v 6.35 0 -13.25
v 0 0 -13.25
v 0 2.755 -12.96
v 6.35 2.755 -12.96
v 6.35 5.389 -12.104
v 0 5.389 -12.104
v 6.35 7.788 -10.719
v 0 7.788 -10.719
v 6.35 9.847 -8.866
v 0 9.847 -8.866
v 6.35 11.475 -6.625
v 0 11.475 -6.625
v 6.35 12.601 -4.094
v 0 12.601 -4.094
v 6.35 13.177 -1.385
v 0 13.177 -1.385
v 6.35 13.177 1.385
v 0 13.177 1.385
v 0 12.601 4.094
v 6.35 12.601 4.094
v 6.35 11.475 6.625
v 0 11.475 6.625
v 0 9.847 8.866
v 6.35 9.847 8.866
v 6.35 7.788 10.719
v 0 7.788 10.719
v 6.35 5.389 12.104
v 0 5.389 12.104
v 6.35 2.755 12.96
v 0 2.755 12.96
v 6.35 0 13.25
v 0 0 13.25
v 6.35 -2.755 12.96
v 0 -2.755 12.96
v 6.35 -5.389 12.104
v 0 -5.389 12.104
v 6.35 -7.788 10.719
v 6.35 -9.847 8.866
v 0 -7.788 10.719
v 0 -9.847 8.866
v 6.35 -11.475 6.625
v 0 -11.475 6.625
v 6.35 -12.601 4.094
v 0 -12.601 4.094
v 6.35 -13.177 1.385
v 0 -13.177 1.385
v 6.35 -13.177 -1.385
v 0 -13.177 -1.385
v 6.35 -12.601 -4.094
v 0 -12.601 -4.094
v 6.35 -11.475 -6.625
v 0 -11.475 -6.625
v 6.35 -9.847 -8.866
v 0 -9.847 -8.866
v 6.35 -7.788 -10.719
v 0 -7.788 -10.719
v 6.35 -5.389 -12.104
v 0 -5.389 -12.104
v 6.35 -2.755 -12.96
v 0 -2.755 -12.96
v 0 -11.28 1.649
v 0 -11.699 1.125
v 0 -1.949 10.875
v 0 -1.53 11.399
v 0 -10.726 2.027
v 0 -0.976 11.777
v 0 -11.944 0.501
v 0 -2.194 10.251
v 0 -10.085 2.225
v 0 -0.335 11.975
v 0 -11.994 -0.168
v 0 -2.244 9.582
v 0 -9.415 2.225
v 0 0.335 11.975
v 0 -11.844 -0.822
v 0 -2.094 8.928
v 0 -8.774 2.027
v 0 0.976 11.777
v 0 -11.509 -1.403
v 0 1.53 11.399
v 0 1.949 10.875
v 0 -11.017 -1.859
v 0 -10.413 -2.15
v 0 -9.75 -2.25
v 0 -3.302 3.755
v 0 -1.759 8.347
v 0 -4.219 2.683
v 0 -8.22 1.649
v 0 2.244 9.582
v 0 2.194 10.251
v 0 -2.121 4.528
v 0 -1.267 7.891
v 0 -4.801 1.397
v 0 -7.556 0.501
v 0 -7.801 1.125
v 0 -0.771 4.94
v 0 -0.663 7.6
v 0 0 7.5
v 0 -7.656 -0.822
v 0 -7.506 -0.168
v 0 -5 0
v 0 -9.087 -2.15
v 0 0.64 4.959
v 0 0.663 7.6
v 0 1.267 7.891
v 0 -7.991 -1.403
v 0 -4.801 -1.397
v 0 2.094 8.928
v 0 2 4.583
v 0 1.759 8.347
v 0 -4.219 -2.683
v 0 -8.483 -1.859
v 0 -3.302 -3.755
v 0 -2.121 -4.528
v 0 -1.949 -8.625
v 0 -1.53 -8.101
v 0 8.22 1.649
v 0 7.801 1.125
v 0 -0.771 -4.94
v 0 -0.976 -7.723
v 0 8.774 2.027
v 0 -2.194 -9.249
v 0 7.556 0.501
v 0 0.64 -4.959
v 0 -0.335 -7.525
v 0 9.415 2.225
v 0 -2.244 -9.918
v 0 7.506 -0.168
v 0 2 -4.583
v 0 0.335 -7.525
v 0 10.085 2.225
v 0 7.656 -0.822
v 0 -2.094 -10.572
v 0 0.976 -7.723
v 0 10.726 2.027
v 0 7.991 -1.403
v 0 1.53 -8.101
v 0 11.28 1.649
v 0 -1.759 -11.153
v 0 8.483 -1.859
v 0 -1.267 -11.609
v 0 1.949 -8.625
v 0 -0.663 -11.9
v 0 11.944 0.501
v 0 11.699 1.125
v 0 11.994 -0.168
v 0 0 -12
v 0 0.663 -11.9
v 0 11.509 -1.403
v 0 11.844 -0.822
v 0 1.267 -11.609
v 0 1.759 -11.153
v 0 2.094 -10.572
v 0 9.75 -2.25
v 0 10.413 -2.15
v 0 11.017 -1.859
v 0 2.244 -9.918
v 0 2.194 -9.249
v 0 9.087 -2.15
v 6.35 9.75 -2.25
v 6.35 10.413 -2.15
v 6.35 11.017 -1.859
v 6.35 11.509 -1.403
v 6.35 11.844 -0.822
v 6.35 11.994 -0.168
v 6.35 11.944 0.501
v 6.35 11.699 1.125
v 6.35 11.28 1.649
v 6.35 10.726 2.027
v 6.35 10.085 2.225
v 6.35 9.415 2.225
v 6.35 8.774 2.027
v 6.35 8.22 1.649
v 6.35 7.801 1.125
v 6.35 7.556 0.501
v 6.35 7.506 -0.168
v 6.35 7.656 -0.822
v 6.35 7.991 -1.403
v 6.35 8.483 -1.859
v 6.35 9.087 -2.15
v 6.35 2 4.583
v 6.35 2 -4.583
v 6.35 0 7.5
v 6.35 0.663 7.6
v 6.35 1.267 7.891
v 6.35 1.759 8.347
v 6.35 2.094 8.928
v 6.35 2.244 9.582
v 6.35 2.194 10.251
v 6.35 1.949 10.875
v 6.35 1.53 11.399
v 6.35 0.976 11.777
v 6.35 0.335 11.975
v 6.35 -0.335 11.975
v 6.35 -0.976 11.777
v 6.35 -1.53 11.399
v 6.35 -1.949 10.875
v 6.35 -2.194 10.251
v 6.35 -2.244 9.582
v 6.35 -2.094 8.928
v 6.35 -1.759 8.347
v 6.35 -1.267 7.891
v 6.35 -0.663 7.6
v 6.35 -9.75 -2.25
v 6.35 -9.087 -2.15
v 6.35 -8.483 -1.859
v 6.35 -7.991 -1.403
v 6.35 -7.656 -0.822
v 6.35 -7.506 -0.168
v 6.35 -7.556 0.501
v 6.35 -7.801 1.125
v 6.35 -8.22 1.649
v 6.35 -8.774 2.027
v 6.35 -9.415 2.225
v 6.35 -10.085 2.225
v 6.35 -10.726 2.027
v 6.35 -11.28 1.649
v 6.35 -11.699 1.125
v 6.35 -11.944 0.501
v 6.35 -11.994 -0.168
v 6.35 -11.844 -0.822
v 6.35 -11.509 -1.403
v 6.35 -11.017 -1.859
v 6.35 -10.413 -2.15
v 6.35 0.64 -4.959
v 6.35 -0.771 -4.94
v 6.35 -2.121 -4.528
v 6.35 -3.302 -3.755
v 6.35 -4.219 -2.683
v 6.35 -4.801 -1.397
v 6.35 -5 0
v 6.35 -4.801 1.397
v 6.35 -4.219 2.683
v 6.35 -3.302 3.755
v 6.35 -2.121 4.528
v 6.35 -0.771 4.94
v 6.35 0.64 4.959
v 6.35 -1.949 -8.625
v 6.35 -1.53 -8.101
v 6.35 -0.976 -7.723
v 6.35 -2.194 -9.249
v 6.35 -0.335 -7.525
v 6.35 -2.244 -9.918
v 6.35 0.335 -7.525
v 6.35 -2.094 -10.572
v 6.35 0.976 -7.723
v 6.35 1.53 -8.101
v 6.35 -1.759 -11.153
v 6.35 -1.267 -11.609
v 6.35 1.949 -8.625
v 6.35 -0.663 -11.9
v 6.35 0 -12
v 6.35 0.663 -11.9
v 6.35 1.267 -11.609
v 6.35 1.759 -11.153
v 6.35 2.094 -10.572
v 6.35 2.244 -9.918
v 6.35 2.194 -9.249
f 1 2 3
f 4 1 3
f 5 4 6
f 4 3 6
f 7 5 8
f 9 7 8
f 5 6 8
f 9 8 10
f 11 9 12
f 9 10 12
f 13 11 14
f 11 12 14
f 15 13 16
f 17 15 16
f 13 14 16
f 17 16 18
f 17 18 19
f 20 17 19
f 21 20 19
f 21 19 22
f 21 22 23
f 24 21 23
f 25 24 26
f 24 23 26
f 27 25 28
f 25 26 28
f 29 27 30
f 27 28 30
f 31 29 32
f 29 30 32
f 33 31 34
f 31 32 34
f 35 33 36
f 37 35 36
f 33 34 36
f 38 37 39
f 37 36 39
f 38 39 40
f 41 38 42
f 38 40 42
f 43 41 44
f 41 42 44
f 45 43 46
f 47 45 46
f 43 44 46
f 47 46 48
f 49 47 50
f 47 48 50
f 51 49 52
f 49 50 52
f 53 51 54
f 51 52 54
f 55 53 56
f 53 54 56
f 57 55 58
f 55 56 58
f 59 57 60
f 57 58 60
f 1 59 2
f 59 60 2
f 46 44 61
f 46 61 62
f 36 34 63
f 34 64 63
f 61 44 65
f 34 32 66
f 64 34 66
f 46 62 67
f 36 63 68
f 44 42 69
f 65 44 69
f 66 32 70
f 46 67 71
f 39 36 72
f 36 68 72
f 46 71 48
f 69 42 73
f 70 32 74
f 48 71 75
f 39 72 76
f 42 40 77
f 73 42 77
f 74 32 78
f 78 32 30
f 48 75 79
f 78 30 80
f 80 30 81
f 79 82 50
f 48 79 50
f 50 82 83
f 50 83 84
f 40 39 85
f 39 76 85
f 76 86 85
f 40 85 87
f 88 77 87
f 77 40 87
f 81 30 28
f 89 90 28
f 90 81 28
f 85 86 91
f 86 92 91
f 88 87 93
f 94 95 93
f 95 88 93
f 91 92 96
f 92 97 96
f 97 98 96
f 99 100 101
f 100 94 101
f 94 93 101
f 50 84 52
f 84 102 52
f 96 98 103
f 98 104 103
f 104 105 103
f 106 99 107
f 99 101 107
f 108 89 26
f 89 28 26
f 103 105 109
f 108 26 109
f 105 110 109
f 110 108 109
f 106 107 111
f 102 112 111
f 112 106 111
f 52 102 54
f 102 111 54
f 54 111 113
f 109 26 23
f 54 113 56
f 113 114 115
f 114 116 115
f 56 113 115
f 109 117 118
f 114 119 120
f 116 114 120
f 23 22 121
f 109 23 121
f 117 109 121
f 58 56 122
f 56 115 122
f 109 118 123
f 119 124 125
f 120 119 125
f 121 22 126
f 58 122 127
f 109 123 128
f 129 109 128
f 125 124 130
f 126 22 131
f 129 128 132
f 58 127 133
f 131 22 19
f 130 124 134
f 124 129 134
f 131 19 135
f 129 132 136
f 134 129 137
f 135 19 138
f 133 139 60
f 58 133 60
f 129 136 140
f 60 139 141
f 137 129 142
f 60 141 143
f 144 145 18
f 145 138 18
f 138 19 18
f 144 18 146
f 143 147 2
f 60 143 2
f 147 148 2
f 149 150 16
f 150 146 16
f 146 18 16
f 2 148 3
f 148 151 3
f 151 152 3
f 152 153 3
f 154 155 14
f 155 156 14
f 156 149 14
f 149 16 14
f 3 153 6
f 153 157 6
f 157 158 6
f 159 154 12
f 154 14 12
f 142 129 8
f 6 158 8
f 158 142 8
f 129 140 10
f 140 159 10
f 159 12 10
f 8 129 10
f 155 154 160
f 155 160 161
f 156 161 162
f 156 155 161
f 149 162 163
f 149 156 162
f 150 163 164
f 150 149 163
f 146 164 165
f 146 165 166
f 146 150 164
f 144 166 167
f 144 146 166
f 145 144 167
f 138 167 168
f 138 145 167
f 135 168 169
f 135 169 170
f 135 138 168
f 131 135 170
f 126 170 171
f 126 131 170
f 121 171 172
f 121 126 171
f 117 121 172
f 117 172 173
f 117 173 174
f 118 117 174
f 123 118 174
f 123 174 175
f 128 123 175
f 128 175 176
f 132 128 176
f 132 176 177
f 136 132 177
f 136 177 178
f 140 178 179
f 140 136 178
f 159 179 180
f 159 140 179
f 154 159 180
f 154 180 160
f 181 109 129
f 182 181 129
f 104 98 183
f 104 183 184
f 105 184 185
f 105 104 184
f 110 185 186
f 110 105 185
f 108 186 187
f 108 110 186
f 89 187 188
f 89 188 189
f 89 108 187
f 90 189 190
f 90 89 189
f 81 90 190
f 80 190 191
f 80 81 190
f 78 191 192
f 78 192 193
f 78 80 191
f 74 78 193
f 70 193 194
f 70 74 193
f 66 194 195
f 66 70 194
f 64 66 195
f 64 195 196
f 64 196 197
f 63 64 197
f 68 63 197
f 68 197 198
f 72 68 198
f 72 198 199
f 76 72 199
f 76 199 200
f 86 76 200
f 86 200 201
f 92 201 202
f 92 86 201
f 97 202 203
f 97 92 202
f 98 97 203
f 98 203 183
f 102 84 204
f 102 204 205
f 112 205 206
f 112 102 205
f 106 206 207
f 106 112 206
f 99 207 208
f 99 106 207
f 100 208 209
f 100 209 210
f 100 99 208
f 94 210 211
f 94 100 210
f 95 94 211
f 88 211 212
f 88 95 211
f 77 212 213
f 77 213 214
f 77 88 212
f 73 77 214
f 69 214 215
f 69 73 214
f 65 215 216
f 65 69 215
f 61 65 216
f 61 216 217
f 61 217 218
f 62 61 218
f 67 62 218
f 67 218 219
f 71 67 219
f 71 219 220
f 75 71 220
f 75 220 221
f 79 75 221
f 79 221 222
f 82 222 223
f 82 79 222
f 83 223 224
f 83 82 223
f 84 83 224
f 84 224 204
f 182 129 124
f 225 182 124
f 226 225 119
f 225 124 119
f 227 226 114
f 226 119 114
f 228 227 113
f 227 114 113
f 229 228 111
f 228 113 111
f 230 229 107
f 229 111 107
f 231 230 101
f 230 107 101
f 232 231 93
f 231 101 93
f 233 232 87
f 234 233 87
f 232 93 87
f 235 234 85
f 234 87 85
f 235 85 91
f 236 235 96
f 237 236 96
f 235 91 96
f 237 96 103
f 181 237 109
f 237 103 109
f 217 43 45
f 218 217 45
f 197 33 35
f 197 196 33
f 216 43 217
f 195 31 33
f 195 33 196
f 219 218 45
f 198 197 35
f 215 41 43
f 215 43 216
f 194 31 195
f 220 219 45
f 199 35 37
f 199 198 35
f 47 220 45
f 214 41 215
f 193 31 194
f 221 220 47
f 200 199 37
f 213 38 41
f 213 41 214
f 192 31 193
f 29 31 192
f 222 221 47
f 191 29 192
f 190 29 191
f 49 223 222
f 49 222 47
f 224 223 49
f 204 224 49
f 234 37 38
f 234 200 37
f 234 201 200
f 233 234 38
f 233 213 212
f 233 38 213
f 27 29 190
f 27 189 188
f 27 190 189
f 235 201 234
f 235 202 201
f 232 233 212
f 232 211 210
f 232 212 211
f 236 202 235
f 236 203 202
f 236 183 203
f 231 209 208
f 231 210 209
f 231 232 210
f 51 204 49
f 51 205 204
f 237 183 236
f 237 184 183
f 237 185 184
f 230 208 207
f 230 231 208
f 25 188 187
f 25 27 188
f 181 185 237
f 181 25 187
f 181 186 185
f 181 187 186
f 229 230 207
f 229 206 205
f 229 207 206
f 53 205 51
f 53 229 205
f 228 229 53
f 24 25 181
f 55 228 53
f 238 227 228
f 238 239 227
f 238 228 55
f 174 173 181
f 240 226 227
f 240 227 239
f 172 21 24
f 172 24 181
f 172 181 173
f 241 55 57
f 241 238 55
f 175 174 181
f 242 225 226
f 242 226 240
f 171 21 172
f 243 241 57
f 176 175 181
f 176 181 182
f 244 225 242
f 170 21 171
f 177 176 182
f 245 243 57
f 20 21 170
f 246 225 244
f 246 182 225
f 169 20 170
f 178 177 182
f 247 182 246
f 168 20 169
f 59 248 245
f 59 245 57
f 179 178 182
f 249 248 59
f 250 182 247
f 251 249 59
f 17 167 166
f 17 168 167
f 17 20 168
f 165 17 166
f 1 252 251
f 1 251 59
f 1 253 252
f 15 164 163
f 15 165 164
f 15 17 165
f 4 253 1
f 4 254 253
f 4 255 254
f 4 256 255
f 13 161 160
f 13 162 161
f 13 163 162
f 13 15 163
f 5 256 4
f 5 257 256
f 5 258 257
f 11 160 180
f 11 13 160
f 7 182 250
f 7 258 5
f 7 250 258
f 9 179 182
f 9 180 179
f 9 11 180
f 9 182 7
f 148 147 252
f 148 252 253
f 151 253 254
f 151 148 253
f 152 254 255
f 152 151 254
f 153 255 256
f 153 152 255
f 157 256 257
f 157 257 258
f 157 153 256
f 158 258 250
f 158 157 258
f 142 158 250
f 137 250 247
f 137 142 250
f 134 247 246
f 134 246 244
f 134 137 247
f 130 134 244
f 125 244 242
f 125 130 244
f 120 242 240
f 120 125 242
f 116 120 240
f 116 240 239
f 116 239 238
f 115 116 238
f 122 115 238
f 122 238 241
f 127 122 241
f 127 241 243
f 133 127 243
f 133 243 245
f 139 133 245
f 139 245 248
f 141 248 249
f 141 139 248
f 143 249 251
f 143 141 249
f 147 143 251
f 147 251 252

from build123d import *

# Parameters (mm, degrees)
SKETCH1_R           = 13.25
SKETCH1_R_2         = 2.25
BOSS_EXTRUDE1_DEPTH = 6.35


with BuildPart() as part:
    # Sketch1 → Boss-Extrude1 (new body)
    with BuildSketch(Plane(origin=(0, 0, 0), x_dir=(0, 0, -1), z_dir=(1, 0, 0))):
        Circle(SKETCH1_R)
        with Locations((-9.75, 0)):
            Circle(SKETCH1_R_2, mode=Mode.SUBTRACT)
        with Locations((0, 9.75)):
            Circle(SKETCH1_R_2, mode=Mode.SUBTRACT)
        with Locations((9.75, 0)):
            Circle(SKETCH1_R_2, mode=Mode.SUBTRACT)
        with Locations((0, -9.75)):
            Circle(SKETCH1_R_2, mode=Mode.SUBTRACT)
        with BuildLine():
            Line((-4.582575695, 2), (4.582575695, 2))
            ThreePointArc((4.582575695, 2), (0, -5), (-4.582575695, 2))
        make_face(mode=Mode.SUBTRACT)
    extrude(amount=BOSS_EXTRUDE1_DEPTH)


solid = part.part
